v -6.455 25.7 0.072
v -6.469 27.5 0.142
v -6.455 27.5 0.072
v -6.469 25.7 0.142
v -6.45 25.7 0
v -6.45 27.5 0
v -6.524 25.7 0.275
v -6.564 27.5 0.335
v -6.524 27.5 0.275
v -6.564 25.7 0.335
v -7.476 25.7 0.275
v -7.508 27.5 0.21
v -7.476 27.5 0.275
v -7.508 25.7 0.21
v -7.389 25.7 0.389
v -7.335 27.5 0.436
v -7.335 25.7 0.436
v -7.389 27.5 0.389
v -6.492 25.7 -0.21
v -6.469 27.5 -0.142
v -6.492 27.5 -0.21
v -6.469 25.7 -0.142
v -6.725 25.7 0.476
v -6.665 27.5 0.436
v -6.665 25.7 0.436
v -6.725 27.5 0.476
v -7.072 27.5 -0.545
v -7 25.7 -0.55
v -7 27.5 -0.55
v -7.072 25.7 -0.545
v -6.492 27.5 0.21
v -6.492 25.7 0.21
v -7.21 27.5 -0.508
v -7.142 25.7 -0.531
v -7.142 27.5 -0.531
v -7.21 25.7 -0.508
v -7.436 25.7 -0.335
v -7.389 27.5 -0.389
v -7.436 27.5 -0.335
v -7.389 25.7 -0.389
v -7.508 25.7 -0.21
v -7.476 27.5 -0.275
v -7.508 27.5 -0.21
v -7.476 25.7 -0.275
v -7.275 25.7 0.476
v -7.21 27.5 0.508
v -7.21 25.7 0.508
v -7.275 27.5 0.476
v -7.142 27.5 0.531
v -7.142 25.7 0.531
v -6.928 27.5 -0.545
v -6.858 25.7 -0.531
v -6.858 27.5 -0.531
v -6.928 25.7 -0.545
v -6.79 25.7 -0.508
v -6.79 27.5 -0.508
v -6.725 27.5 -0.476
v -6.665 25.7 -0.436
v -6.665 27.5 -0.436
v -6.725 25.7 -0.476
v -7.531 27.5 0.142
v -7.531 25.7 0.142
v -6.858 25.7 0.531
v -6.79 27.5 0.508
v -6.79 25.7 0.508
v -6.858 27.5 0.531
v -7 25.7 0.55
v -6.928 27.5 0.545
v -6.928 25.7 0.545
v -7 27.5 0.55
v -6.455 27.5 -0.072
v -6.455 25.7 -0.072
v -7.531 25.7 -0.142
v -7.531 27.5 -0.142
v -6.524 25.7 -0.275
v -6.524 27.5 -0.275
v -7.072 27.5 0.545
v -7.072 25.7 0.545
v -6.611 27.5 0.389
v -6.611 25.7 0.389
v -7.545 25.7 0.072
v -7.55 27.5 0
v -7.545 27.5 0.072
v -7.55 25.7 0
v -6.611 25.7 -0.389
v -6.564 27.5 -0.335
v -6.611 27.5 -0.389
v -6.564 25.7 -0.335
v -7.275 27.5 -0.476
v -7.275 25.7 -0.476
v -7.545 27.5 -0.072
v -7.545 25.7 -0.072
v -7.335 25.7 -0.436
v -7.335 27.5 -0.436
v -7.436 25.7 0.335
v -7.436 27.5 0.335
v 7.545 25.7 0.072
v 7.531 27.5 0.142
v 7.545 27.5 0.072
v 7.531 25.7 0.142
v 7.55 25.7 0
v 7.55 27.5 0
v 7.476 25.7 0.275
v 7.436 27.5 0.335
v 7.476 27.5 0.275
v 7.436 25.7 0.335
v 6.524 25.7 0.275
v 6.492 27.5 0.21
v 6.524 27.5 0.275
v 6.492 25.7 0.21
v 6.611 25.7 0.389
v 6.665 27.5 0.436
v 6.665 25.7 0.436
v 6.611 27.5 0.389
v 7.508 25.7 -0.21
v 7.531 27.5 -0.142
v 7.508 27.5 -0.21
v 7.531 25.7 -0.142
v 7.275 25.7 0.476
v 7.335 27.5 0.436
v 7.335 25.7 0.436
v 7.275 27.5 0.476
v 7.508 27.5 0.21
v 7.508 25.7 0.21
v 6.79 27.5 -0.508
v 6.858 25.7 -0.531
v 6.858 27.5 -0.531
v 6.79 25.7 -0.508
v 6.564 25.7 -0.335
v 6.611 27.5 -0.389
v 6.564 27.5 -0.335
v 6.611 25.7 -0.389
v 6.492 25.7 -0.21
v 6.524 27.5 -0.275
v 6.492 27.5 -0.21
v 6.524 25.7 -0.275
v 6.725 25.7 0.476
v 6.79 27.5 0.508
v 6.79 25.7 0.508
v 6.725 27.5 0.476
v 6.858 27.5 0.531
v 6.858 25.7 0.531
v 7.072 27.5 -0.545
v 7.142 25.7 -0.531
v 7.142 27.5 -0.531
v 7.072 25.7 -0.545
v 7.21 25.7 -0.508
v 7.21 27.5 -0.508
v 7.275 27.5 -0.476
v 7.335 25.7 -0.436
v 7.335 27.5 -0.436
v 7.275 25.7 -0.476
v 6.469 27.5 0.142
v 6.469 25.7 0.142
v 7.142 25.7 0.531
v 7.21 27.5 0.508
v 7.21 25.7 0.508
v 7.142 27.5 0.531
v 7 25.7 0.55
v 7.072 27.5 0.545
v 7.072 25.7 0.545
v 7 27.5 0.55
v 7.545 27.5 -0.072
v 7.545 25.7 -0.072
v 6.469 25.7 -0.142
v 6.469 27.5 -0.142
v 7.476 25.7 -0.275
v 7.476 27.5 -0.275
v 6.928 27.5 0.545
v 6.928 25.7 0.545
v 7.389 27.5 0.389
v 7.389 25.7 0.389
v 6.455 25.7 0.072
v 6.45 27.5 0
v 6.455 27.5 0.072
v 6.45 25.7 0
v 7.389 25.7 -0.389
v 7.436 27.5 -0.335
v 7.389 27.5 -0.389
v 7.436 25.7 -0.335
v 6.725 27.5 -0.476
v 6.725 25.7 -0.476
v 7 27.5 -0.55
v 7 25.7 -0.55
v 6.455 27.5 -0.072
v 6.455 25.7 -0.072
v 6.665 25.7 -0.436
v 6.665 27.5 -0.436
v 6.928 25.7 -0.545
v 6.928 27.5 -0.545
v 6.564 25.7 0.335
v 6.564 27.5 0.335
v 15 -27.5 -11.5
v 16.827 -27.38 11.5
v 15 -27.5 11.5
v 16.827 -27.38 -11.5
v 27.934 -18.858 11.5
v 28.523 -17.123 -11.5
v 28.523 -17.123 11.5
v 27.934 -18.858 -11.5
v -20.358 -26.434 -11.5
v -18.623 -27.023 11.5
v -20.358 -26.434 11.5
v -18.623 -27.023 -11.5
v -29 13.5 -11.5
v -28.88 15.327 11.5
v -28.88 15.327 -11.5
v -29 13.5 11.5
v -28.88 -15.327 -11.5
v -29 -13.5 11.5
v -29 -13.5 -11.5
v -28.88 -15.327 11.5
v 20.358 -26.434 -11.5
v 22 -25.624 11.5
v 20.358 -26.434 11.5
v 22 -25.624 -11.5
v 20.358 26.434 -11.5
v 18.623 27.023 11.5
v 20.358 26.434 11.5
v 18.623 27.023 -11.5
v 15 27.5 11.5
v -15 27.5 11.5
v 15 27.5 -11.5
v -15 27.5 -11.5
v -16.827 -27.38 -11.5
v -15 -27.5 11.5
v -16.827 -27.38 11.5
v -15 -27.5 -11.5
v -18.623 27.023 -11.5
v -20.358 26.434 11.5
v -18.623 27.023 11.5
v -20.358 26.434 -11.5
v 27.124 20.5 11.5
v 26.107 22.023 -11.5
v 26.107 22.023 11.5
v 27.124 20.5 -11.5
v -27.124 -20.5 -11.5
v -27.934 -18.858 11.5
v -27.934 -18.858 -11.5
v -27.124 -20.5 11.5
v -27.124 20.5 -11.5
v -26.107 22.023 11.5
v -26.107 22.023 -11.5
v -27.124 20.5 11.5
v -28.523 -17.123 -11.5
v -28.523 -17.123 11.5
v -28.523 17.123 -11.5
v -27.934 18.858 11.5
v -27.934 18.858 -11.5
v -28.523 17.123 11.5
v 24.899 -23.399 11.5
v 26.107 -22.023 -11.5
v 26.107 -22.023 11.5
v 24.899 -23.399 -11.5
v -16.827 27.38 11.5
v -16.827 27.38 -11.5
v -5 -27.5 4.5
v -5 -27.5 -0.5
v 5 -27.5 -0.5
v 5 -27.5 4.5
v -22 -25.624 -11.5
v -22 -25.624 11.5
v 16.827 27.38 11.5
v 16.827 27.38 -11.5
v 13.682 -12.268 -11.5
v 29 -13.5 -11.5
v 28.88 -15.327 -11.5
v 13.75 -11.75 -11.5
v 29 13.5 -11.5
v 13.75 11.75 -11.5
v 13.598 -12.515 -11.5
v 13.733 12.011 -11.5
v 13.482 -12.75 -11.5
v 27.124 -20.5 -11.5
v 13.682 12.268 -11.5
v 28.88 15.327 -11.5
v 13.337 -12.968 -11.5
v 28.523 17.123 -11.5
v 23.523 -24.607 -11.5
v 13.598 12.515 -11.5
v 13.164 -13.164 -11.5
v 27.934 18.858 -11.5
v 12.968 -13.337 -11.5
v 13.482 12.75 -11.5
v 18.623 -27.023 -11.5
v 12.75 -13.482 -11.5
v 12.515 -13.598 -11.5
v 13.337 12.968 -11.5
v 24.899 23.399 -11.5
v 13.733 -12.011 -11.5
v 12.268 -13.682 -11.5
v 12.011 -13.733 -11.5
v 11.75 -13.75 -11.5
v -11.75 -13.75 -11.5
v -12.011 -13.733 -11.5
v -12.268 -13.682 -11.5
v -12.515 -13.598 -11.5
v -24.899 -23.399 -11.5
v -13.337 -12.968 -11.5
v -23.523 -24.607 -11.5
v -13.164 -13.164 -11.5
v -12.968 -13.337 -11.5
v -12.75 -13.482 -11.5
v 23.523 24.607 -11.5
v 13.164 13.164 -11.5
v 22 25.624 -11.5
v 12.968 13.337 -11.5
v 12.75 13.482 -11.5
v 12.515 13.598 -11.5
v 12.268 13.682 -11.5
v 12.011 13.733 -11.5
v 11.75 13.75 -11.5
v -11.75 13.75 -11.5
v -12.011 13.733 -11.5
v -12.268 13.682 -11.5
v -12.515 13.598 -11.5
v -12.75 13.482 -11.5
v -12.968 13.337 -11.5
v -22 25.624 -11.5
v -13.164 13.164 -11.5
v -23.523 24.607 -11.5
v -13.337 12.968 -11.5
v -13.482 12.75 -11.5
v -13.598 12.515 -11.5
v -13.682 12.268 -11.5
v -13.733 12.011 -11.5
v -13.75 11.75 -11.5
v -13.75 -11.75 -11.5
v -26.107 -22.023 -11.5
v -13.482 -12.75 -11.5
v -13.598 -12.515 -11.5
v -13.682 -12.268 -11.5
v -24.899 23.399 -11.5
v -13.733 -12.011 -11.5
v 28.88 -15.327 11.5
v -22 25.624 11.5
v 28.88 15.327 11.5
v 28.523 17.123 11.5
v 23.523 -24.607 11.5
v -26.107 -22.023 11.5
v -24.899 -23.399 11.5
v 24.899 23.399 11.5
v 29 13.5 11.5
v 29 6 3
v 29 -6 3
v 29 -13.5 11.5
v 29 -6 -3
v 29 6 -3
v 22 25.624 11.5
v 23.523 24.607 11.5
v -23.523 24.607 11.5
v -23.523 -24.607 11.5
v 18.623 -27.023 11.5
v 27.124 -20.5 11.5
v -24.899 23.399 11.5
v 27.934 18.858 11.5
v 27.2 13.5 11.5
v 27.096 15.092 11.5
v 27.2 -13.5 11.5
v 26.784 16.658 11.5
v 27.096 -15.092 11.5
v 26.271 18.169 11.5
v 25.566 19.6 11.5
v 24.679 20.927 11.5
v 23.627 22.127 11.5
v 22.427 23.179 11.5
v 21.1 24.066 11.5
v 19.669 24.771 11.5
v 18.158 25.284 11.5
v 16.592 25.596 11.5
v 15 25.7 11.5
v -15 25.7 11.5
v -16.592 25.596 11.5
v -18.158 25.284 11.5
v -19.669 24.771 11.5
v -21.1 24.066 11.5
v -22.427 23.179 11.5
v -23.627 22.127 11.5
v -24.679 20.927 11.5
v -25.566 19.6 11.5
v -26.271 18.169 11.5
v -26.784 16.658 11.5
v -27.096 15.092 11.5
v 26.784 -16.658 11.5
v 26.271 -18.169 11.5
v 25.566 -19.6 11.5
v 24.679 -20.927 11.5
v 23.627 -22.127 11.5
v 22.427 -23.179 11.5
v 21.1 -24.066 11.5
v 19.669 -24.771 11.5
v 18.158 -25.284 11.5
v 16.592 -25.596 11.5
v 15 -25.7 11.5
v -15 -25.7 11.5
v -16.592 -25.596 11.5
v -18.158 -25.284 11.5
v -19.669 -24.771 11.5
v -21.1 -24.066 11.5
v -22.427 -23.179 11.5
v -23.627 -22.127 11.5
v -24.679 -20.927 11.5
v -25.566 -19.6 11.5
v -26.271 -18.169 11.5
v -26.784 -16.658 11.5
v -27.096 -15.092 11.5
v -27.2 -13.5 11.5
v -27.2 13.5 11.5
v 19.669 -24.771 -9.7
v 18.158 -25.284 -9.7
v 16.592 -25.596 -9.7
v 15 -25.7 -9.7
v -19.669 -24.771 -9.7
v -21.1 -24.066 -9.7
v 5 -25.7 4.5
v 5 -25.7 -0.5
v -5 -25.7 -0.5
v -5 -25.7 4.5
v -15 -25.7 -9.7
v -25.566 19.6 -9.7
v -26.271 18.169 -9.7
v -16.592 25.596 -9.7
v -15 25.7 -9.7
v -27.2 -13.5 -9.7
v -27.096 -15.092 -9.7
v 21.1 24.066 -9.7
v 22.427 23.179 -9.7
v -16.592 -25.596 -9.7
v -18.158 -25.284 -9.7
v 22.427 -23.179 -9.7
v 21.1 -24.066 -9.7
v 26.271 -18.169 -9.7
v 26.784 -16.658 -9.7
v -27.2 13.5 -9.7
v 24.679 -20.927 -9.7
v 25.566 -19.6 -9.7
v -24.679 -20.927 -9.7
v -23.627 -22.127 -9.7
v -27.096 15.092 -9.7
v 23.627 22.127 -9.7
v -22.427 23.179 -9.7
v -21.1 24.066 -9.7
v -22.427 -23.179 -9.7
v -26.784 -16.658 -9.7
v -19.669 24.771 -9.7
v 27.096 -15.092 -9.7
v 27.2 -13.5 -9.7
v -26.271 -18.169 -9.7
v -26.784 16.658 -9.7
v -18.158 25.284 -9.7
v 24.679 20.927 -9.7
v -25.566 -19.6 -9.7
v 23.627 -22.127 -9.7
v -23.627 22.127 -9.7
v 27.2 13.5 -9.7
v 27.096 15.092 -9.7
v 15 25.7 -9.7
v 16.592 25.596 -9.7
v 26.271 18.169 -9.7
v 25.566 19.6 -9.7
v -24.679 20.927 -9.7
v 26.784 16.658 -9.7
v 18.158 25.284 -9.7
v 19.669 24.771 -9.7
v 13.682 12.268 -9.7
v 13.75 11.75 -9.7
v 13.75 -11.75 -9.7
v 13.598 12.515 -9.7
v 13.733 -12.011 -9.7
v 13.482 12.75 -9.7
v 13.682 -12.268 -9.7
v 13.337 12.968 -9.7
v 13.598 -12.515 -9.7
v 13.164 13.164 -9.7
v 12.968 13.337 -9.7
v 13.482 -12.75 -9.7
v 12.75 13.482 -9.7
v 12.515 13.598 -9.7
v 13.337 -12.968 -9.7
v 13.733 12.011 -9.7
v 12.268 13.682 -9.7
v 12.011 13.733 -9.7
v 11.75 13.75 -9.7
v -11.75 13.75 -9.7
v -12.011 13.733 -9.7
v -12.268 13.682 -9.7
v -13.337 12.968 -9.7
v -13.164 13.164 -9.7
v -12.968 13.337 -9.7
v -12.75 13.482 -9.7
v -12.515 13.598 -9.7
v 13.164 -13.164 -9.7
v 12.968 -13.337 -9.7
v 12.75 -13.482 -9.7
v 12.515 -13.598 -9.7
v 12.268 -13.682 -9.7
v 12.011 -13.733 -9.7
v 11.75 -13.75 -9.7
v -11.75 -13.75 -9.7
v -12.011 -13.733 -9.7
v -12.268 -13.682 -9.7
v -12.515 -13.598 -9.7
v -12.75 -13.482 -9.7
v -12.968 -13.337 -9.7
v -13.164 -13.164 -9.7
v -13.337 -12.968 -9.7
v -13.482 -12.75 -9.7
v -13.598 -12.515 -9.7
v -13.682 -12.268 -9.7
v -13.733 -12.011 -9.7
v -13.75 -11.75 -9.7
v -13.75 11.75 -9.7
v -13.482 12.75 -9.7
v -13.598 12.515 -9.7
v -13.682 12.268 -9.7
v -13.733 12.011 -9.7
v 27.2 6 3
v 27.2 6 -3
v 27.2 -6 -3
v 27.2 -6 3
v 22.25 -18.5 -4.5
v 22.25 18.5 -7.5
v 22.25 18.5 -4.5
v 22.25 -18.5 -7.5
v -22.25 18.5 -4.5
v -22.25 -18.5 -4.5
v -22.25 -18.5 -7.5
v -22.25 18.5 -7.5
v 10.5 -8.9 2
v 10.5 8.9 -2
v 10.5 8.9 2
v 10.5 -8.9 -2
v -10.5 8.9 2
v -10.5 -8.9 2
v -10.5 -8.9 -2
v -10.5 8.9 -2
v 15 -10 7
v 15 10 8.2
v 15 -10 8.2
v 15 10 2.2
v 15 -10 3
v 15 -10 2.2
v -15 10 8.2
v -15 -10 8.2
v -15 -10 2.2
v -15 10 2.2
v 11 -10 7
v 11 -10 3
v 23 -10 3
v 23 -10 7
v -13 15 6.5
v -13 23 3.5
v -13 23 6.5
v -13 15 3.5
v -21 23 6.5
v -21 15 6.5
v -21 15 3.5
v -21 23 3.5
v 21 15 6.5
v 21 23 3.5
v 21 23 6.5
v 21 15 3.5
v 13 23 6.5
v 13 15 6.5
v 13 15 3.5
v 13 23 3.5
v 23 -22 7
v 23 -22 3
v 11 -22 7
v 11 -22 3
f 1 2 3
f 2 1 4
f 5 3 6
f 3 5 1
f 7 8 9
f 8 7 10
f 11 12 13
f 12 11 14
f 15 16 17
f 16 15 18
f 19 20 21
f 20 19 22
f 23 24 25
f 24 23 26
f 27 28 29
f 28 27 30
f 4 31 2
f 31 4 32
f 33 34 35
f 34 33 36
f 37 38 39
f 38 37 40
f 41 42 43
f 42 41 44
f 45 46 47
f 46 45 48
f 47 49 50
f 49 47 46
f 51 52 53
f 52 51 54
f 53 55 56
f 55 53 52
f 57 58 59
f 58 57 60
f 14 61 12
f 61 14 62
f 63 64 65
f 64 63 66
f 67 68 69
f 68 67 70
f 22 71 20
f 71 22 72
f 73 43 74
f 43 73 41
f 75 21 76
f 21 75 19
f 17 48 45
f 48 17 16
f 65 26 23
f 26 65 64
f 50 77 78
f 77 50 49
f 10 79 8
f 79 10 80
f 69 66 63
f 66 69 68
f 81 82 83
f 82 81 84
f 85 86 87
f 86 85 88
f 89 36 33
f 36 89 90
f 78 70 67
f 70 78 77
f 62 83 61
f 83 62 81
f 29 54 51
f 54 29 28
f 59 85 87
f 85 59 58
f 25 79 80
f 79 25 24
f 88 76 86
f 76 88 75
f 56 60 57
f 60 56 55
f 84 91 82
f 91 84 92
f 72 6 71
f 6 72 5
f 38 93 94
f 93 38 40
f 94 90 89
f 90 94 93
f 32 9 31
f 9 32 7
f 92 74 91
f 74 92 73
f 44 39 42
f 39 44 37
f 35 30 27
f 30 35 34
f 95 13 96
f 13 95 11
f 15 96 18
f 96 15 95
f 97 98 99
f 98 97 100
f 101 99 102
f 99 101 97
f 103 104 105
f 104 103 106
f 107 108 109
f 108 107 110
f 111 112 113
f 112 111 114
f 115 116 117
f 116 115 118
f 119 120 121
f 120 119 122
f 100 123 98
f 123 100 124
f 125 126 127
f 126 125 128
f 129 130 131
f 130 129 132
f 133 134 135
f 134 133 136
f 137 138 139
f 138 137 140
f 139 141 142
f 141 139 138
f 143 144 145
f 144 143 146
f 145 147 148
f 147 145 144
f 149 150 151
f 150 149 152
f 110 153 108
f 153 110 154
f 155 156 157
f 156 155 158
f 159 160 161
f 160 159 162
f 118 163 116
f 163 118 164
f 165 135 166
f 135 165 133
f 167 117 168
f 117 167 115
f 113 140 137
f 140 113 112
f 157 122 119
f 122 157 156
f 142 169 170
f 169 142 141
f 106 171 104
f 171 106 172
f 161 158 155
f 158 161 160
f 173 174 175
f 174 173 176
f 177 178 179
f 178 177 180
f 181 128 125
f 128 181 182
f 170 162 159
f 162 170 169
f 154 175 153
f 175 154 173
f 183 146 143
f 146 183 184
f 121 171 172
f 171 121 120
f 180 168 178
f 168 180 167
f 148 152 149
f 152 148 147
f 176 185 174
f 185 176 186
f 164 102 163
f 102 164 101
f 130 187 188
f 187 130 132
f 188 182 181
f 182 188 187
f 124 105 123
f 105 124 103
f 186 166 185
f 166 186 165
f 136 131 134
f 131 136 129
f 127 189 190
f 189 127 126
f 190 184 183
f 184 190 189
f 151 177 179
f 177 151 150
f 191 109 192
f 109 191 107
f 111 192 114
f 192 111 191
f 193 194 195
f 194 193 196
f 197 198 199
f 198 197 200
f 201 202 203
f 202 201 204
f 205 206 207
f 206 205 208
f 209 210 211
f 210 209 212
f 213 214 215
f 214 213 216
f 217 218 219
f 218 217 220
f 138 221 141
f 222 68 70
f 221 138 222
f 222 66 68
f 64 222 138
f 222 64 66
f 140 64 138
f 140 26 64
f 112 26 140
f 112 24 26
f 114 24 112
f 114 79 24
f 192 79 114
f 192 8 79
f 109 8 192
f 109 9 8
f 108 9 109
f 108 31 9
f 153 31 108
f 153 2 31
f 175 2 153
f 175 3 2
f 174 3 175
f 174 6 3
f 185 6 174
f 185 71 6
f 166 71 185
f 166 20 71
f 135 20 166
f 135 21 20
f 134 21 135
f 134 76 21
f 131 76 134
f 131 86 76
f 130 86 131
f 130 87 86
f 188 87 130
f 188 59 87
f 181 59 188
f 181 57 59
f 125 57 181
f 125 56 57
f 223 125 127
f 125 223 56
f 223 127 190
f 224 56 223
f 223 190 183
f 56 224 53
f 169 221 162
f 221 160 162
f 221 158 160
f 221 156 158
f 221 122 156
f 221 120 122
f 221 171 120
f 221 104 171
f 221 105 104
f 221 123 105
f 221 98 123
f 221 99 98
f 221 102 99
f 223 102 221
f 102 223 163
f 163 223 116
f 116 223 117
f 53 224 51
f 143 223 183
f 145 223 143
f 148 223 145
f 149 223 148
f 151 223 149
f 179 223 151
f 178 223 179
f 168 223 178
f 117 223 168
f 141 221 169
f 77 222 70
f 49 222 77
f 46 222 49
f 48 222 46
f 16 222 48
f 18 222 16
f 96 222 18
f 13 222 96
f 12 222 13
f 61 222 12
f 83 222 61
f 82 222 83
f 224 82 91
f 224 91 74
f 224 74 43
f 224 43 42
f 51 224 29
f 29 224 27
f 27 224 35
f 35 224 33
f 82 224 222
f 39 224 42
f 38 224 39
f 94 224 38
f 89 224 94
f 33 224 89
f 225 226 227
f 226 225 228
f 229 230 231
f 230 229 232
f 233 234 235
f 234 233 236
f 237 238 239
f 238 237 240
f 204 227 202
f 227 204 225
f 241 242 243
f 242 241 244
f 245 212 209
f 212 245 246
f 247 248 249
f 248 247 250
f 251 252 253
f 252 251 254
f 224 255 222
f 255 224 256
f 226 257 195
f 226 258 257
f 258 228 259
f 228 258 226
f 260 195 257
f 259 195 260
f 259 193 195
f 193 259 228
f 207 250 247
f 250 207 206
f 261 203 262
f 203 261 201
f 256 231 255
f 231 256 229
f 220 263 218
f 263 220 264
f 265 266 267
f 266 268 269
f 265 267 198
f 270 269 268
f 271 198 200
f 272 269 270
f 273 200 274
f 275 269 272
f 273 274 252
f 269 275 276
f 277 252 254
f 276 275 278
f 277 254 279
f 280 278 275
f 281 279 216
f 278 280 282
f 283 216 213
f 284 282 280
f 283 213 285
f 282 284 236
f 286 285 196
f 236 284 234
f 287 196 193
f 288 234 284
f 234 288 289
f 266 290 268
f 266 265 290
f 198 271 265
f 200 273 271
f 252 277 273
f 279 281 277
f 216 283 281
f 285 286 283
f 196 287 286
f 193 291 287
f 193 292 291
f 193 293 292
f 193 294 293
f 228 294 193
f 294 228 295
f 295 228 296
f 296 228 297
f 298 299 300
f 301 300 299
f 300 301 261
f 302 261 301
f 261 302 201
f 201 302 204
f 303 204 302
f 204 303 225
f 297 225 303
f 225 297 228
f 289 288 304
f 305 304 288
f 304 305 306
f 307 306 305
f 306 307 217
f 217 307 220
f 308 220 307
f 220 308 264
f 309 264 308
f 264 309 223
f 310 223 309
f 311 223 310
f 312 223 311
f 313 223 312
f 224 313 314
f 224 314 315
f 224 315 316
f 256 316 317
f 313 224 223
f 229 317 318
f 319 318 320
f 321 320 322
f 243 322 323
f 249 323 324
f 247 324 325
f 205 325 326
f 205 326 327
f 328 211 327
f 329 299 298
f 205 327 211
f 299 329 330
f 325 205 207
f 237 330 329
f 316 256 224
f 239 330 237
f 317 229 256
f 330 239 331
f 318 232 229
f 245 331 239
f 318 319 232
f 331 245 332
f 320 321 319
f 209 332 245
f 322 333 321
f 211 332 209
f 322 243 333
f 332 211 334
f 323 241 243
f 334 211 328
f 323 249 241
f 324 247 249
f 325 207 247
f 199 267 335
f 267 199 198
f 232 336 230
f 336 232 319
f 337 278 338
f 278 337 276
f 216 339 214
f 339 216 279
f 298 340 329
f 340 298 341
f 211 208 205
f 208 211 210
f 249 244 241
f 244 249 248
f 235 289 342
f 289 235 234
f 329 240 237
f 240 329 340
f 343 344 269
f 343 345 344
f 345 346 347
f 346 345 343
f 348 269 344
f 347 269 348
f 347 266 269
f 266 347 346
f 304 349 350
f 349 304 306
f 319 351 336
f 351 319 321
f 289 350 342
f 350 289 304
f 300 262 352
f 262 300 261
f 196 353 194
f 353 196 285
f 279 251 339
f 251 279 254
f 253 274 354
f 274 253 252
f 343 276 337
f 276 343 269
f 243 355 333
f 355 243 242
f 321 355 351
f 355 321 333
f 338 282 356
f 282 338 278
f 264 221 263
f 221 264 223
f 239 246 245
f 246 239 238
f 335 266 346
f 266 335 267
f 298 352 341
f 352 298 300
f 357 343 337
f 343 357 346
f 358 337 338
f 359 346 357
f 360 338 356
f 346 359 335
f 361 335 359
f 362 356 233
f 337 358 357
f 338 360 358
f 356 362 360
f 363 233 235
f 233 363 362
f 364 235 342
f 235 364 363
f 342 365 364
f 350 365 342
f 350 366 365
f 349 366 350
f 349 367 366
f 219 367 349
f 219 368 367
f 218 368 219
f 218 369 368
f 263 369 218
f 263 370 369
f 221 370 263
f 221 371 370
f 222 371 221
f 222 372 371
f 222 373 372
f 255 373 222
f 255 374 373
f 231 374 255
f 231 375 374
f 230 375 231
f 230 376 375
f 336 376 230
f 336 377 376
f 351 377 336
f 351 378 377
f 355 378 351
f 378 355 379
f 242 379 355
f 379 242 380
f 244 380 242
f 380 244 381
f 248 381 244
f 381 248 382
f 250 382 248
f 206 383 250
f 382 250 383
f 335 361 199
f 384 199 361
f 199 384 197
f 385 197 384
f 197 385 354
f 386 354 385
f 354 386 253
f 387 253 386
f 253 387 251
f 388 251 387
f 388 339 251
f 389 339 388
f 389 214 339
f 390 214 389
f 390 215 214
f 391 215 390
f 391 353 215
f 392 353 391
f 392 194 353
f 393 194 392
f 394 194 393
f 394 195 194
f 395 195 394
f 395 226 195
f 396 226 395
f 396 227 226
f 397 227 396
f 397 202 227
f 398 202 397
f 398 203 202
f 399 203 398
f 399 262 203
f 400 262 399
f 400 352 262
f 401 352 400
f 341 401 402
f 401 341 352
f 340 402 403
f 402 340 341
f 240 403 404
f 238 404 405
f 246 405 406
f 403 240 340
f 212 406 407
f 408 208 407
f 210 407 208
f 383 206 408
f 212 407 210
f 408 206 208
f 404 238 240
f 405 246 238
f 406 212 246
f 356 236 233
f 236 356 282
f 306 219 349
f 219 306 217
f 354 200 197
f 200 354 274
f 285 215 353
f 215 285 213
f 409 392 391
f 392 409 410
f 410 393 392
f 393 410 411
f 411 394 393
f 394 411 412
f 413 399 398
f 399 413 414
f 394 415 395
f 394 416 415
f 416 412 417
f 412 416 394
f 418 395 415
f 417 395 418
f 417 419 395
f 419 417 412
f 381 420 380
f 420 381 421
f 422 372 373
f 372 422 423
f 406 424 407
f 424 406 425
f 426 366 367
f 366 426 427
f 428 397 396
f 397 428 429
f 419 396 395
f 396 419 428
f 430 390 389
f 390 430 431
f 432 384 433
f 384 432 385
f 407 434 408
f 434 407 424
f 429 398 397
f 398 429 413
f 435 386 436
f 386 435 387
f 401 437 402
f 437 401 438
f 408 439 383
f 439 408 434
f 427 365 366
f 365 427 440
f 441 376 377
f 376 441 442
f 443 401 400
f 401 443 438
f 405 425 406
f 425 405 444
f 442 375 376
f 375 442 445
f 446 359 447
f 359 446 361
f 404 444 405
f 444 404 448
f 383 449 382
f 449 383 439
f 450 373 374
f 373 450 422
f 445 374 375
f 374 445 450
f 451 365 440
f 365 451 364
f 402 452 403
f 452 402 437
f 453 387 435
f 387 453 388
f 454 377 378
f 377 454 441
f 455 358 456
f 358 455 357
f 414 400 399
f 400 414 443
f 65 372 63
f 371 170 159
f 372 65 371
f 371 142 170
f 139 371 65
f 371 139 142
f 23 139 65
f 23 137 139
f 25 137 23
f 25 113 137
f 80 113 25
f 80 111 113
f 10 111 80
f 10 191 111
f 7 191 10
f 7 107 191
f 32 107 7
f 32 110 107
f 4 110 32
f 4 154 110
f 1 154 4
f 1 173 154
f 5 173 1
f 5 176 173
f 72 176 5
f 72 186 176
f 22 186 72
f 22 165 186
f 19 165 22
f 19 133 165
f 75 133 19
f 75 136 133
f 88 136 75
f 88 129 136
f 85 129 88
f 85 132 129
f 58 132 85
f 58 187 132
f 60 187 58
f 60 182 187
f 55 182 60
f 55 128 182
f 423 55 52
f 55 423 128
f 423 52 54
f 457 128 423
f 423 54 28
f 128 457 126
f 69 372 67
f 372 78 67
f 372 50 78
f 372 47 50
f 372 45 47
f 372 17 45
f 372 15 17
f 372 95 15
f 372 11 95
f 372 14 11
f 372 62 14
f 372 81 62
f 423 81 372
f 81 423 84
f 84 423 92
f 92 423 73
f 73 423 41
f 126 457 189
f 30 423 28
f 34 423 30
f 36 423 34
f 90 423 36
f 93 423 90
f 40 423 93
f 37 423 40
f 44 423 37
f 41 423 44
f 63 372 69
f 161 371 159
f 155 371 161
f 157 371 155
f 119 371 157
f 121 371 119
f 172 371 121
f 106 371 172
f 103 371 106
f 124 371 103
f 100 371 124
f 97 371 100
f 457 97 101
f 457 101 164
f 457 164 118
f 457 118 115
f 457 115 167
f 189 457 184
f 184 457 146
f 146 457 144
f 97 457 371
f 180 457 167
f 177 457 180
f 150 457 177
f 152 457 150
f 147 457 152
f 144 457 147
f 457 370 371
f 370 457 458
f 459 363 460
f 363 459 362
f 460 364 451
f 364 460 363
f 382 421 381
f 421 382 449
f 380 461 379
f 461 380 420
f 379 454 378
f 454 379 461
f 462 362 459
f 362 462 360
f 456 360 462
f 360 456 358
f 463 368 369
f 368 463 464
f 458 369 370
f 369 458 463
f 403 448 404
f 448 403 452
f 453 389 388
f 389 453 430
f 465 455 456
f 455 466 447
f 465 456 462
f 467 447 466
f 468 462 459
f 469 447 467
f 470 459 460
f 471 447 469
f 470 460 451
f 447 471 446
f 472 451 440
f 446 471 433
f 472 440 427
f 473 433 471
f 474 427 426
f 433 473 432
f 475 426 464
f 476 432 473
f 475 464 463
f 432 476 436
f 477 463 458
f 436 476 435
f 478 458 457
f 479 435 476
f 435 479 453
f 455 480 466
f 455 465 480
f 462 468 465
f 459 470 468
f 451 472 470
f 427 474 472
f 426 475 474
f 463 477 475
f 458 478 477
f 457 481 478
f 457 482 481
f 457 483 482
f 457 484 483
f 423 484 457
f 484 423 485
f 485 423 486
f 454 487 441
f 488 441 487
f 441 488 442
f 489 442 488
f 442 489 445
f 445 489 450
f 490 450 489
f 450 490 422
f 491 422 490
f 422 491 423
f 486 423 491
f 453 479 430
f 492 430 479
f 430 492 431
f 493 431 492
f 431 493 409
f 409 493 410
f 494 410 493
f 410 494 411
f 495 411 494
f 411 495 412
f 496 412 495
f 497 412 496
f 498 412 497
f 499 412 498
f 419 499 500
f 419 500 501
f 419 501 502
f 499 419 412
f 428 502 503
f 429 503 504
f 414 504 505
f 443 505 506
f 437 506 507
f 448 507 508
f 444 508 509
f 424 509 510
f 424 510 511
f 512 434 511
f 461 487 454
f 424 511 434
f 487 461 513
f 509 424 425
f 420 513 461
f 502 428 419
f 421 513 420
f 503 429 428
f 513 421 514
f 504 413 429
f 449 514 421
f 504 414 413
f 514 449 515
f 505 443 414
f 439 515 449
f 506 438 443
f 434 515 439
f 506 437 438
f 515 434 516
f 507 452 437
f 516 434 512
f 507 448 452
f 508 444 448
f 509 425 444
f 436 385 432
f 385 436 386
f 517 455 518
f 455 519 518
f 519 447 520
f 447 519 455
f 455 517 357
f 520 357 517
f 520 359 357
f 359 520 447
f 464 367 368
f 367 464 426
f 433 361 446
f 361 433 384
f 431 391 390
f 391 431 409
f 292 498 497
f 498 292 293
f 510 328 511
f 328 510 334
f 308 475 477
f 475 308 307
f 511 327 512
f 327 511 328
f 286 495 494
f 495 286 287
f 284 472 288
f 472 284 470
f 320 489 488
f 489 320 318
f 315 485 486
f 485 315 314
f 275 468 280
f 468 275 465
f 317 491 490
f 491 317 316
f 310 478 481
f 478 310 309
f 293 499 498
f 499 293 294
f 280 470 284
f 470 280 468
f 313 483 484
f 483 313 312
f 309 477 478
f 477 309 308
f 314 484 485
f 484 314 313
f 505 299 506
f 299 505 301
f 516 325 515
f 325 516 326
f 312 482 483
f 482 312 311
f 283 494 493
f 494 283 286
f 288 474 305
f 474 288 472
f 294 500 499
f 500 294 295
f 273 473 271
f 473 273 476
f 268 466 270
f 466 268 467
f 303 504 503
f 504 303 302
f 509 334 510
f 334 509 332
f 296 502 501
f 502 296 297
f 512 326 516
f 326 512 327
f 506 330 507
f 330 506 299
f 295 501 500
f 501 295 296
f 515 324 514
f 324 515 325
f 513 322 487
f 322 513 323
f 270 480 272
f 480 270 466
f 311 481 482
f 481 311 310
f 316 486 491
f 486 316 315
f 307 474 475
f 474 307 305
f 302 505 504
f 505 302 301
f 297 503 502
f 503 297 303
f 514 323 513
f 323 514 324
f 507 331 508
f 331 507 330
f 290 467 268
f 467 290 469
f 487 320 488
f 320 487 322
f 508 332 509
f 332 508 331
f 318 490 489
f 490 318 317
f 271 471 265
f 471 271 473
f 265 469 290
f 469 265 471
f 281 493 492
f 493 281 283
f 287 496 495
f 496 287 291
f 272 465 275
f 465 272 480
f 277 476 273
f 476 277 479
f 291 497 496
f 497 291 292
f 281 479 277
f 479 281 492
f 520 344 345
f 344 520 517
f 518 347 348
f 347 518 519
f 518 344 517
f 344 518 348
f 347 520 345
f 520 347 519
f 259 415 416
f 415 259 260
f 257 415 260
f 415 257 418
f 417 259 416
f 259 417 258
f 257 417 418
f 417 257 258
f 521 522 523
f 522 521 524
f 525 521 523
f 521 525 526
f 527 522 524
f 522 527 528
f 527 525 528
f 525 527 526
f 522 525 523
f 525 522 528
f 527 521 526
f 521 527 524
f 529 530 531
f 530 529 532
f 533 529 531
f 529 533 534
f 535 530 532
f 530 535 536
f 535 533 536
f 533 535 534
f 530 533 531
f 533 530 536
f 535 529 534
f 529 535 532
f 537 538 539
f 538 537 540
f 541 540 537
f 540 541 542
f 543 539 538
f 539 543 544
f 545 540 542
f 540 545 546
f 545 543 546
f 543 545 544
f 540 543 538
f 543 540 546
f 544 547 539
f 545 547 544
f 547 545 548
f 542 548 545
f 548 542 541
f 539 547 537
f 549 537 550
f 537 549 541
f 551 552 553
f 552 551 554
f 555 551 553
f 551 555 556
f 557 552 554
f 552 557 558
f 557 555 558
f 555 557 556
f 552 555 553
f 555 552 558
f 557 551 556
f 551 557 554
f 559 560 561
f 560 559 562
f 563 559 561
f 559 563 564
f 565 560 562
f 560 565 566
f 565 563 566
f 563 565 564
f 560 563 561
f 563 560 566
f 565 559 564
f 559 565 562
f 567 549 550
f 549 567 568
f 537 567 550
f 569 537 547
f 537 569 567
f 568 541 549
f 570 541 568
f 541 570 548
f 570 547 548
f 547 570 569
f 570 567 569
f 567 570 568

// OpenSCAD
// OpenAGI Pocket — dimensional concept, millimeters.
// This is an envelope/clearance study, not a proven printable enclosure.
// Set mode to "shell" for a printable solid, or "layout" for proxy parts.
mode = "layout";
width = 58;
height = 55;
depth = 23;
wall = 1.8;
corner = 14;
$fn = 48;

module rounded_rect(w,h,r){offset(r=r) square([w-2*r,h-2*r],center=true);}
module rounded_box(w,h,d,r){linear_extrude(height=d,center=true) rounded_rect(w,h,r);}

module shell(){
  difference(){
    rounded_box(width,height,depth,corner);
    // Two-piece shell cavity. Open rear; add screw tabs and real tolerances after measurement.
    translate([0,0,wall]) rounded_box(width-2*wall,height-2*wall,depth,corner-wall);
    // OLED active window: 26.86 mm square plus 0.6 mm viewing margin.
    translate([0,0,-depth/2]) linear_extrude(height=wall*2,center=true)
      rounded_rect(27.5,27.5,2);
    // Right-edge rocker clearance.
    translate([width/2,0,0]) cube([wall*3,12,6],center=true);
    // Bottom charging connector access. Connector and strain relief remain to be validated.
    translate([0,-height/2,2]) cube([10,wall*3,5],center=true);
    // Top microphone ports.
    for(x=[-7,7]) translate([x,height/2,0]) rotate([90,0,0]) cylinder(h=wall*3,d=1.1,center=true);
  }
}

module layout(){
  color([.12,.12,.12]) shell();
  // Verified XY module footprint; Z is an allowance, not manufacturer-certified.
  color([.1,.5,.85,.6]) translate([0,0,-6.0]) cube([44.5,37,3],center=true); // Waveshare RGB OLED
  color([.2,.8,.3,.6]) translate([0,0,0]) cube([21,17.8,4],center=true); // XIAO ESP32-S3 board
  color([.9,.5,.1,.6]) translate([0,0,5.2]) cube([30,20,6],center=true); // LiPo proxy ONLY
  color([.8,.2,.5,.6]) translate([-17,19,5]) cube([8,8,3],center=true); // microphone proxy
  color([.8,.2,.5,.6]) translate([17,19,5]) cube([8,8,3],center=true); // second mic proxy
  color([.7,.7,.1,.6]) translate([17,-16,5]) cube([12,12,4],center=true); // speaker/amp proxy
}

if(mode=="shell") shell(); else layout();
